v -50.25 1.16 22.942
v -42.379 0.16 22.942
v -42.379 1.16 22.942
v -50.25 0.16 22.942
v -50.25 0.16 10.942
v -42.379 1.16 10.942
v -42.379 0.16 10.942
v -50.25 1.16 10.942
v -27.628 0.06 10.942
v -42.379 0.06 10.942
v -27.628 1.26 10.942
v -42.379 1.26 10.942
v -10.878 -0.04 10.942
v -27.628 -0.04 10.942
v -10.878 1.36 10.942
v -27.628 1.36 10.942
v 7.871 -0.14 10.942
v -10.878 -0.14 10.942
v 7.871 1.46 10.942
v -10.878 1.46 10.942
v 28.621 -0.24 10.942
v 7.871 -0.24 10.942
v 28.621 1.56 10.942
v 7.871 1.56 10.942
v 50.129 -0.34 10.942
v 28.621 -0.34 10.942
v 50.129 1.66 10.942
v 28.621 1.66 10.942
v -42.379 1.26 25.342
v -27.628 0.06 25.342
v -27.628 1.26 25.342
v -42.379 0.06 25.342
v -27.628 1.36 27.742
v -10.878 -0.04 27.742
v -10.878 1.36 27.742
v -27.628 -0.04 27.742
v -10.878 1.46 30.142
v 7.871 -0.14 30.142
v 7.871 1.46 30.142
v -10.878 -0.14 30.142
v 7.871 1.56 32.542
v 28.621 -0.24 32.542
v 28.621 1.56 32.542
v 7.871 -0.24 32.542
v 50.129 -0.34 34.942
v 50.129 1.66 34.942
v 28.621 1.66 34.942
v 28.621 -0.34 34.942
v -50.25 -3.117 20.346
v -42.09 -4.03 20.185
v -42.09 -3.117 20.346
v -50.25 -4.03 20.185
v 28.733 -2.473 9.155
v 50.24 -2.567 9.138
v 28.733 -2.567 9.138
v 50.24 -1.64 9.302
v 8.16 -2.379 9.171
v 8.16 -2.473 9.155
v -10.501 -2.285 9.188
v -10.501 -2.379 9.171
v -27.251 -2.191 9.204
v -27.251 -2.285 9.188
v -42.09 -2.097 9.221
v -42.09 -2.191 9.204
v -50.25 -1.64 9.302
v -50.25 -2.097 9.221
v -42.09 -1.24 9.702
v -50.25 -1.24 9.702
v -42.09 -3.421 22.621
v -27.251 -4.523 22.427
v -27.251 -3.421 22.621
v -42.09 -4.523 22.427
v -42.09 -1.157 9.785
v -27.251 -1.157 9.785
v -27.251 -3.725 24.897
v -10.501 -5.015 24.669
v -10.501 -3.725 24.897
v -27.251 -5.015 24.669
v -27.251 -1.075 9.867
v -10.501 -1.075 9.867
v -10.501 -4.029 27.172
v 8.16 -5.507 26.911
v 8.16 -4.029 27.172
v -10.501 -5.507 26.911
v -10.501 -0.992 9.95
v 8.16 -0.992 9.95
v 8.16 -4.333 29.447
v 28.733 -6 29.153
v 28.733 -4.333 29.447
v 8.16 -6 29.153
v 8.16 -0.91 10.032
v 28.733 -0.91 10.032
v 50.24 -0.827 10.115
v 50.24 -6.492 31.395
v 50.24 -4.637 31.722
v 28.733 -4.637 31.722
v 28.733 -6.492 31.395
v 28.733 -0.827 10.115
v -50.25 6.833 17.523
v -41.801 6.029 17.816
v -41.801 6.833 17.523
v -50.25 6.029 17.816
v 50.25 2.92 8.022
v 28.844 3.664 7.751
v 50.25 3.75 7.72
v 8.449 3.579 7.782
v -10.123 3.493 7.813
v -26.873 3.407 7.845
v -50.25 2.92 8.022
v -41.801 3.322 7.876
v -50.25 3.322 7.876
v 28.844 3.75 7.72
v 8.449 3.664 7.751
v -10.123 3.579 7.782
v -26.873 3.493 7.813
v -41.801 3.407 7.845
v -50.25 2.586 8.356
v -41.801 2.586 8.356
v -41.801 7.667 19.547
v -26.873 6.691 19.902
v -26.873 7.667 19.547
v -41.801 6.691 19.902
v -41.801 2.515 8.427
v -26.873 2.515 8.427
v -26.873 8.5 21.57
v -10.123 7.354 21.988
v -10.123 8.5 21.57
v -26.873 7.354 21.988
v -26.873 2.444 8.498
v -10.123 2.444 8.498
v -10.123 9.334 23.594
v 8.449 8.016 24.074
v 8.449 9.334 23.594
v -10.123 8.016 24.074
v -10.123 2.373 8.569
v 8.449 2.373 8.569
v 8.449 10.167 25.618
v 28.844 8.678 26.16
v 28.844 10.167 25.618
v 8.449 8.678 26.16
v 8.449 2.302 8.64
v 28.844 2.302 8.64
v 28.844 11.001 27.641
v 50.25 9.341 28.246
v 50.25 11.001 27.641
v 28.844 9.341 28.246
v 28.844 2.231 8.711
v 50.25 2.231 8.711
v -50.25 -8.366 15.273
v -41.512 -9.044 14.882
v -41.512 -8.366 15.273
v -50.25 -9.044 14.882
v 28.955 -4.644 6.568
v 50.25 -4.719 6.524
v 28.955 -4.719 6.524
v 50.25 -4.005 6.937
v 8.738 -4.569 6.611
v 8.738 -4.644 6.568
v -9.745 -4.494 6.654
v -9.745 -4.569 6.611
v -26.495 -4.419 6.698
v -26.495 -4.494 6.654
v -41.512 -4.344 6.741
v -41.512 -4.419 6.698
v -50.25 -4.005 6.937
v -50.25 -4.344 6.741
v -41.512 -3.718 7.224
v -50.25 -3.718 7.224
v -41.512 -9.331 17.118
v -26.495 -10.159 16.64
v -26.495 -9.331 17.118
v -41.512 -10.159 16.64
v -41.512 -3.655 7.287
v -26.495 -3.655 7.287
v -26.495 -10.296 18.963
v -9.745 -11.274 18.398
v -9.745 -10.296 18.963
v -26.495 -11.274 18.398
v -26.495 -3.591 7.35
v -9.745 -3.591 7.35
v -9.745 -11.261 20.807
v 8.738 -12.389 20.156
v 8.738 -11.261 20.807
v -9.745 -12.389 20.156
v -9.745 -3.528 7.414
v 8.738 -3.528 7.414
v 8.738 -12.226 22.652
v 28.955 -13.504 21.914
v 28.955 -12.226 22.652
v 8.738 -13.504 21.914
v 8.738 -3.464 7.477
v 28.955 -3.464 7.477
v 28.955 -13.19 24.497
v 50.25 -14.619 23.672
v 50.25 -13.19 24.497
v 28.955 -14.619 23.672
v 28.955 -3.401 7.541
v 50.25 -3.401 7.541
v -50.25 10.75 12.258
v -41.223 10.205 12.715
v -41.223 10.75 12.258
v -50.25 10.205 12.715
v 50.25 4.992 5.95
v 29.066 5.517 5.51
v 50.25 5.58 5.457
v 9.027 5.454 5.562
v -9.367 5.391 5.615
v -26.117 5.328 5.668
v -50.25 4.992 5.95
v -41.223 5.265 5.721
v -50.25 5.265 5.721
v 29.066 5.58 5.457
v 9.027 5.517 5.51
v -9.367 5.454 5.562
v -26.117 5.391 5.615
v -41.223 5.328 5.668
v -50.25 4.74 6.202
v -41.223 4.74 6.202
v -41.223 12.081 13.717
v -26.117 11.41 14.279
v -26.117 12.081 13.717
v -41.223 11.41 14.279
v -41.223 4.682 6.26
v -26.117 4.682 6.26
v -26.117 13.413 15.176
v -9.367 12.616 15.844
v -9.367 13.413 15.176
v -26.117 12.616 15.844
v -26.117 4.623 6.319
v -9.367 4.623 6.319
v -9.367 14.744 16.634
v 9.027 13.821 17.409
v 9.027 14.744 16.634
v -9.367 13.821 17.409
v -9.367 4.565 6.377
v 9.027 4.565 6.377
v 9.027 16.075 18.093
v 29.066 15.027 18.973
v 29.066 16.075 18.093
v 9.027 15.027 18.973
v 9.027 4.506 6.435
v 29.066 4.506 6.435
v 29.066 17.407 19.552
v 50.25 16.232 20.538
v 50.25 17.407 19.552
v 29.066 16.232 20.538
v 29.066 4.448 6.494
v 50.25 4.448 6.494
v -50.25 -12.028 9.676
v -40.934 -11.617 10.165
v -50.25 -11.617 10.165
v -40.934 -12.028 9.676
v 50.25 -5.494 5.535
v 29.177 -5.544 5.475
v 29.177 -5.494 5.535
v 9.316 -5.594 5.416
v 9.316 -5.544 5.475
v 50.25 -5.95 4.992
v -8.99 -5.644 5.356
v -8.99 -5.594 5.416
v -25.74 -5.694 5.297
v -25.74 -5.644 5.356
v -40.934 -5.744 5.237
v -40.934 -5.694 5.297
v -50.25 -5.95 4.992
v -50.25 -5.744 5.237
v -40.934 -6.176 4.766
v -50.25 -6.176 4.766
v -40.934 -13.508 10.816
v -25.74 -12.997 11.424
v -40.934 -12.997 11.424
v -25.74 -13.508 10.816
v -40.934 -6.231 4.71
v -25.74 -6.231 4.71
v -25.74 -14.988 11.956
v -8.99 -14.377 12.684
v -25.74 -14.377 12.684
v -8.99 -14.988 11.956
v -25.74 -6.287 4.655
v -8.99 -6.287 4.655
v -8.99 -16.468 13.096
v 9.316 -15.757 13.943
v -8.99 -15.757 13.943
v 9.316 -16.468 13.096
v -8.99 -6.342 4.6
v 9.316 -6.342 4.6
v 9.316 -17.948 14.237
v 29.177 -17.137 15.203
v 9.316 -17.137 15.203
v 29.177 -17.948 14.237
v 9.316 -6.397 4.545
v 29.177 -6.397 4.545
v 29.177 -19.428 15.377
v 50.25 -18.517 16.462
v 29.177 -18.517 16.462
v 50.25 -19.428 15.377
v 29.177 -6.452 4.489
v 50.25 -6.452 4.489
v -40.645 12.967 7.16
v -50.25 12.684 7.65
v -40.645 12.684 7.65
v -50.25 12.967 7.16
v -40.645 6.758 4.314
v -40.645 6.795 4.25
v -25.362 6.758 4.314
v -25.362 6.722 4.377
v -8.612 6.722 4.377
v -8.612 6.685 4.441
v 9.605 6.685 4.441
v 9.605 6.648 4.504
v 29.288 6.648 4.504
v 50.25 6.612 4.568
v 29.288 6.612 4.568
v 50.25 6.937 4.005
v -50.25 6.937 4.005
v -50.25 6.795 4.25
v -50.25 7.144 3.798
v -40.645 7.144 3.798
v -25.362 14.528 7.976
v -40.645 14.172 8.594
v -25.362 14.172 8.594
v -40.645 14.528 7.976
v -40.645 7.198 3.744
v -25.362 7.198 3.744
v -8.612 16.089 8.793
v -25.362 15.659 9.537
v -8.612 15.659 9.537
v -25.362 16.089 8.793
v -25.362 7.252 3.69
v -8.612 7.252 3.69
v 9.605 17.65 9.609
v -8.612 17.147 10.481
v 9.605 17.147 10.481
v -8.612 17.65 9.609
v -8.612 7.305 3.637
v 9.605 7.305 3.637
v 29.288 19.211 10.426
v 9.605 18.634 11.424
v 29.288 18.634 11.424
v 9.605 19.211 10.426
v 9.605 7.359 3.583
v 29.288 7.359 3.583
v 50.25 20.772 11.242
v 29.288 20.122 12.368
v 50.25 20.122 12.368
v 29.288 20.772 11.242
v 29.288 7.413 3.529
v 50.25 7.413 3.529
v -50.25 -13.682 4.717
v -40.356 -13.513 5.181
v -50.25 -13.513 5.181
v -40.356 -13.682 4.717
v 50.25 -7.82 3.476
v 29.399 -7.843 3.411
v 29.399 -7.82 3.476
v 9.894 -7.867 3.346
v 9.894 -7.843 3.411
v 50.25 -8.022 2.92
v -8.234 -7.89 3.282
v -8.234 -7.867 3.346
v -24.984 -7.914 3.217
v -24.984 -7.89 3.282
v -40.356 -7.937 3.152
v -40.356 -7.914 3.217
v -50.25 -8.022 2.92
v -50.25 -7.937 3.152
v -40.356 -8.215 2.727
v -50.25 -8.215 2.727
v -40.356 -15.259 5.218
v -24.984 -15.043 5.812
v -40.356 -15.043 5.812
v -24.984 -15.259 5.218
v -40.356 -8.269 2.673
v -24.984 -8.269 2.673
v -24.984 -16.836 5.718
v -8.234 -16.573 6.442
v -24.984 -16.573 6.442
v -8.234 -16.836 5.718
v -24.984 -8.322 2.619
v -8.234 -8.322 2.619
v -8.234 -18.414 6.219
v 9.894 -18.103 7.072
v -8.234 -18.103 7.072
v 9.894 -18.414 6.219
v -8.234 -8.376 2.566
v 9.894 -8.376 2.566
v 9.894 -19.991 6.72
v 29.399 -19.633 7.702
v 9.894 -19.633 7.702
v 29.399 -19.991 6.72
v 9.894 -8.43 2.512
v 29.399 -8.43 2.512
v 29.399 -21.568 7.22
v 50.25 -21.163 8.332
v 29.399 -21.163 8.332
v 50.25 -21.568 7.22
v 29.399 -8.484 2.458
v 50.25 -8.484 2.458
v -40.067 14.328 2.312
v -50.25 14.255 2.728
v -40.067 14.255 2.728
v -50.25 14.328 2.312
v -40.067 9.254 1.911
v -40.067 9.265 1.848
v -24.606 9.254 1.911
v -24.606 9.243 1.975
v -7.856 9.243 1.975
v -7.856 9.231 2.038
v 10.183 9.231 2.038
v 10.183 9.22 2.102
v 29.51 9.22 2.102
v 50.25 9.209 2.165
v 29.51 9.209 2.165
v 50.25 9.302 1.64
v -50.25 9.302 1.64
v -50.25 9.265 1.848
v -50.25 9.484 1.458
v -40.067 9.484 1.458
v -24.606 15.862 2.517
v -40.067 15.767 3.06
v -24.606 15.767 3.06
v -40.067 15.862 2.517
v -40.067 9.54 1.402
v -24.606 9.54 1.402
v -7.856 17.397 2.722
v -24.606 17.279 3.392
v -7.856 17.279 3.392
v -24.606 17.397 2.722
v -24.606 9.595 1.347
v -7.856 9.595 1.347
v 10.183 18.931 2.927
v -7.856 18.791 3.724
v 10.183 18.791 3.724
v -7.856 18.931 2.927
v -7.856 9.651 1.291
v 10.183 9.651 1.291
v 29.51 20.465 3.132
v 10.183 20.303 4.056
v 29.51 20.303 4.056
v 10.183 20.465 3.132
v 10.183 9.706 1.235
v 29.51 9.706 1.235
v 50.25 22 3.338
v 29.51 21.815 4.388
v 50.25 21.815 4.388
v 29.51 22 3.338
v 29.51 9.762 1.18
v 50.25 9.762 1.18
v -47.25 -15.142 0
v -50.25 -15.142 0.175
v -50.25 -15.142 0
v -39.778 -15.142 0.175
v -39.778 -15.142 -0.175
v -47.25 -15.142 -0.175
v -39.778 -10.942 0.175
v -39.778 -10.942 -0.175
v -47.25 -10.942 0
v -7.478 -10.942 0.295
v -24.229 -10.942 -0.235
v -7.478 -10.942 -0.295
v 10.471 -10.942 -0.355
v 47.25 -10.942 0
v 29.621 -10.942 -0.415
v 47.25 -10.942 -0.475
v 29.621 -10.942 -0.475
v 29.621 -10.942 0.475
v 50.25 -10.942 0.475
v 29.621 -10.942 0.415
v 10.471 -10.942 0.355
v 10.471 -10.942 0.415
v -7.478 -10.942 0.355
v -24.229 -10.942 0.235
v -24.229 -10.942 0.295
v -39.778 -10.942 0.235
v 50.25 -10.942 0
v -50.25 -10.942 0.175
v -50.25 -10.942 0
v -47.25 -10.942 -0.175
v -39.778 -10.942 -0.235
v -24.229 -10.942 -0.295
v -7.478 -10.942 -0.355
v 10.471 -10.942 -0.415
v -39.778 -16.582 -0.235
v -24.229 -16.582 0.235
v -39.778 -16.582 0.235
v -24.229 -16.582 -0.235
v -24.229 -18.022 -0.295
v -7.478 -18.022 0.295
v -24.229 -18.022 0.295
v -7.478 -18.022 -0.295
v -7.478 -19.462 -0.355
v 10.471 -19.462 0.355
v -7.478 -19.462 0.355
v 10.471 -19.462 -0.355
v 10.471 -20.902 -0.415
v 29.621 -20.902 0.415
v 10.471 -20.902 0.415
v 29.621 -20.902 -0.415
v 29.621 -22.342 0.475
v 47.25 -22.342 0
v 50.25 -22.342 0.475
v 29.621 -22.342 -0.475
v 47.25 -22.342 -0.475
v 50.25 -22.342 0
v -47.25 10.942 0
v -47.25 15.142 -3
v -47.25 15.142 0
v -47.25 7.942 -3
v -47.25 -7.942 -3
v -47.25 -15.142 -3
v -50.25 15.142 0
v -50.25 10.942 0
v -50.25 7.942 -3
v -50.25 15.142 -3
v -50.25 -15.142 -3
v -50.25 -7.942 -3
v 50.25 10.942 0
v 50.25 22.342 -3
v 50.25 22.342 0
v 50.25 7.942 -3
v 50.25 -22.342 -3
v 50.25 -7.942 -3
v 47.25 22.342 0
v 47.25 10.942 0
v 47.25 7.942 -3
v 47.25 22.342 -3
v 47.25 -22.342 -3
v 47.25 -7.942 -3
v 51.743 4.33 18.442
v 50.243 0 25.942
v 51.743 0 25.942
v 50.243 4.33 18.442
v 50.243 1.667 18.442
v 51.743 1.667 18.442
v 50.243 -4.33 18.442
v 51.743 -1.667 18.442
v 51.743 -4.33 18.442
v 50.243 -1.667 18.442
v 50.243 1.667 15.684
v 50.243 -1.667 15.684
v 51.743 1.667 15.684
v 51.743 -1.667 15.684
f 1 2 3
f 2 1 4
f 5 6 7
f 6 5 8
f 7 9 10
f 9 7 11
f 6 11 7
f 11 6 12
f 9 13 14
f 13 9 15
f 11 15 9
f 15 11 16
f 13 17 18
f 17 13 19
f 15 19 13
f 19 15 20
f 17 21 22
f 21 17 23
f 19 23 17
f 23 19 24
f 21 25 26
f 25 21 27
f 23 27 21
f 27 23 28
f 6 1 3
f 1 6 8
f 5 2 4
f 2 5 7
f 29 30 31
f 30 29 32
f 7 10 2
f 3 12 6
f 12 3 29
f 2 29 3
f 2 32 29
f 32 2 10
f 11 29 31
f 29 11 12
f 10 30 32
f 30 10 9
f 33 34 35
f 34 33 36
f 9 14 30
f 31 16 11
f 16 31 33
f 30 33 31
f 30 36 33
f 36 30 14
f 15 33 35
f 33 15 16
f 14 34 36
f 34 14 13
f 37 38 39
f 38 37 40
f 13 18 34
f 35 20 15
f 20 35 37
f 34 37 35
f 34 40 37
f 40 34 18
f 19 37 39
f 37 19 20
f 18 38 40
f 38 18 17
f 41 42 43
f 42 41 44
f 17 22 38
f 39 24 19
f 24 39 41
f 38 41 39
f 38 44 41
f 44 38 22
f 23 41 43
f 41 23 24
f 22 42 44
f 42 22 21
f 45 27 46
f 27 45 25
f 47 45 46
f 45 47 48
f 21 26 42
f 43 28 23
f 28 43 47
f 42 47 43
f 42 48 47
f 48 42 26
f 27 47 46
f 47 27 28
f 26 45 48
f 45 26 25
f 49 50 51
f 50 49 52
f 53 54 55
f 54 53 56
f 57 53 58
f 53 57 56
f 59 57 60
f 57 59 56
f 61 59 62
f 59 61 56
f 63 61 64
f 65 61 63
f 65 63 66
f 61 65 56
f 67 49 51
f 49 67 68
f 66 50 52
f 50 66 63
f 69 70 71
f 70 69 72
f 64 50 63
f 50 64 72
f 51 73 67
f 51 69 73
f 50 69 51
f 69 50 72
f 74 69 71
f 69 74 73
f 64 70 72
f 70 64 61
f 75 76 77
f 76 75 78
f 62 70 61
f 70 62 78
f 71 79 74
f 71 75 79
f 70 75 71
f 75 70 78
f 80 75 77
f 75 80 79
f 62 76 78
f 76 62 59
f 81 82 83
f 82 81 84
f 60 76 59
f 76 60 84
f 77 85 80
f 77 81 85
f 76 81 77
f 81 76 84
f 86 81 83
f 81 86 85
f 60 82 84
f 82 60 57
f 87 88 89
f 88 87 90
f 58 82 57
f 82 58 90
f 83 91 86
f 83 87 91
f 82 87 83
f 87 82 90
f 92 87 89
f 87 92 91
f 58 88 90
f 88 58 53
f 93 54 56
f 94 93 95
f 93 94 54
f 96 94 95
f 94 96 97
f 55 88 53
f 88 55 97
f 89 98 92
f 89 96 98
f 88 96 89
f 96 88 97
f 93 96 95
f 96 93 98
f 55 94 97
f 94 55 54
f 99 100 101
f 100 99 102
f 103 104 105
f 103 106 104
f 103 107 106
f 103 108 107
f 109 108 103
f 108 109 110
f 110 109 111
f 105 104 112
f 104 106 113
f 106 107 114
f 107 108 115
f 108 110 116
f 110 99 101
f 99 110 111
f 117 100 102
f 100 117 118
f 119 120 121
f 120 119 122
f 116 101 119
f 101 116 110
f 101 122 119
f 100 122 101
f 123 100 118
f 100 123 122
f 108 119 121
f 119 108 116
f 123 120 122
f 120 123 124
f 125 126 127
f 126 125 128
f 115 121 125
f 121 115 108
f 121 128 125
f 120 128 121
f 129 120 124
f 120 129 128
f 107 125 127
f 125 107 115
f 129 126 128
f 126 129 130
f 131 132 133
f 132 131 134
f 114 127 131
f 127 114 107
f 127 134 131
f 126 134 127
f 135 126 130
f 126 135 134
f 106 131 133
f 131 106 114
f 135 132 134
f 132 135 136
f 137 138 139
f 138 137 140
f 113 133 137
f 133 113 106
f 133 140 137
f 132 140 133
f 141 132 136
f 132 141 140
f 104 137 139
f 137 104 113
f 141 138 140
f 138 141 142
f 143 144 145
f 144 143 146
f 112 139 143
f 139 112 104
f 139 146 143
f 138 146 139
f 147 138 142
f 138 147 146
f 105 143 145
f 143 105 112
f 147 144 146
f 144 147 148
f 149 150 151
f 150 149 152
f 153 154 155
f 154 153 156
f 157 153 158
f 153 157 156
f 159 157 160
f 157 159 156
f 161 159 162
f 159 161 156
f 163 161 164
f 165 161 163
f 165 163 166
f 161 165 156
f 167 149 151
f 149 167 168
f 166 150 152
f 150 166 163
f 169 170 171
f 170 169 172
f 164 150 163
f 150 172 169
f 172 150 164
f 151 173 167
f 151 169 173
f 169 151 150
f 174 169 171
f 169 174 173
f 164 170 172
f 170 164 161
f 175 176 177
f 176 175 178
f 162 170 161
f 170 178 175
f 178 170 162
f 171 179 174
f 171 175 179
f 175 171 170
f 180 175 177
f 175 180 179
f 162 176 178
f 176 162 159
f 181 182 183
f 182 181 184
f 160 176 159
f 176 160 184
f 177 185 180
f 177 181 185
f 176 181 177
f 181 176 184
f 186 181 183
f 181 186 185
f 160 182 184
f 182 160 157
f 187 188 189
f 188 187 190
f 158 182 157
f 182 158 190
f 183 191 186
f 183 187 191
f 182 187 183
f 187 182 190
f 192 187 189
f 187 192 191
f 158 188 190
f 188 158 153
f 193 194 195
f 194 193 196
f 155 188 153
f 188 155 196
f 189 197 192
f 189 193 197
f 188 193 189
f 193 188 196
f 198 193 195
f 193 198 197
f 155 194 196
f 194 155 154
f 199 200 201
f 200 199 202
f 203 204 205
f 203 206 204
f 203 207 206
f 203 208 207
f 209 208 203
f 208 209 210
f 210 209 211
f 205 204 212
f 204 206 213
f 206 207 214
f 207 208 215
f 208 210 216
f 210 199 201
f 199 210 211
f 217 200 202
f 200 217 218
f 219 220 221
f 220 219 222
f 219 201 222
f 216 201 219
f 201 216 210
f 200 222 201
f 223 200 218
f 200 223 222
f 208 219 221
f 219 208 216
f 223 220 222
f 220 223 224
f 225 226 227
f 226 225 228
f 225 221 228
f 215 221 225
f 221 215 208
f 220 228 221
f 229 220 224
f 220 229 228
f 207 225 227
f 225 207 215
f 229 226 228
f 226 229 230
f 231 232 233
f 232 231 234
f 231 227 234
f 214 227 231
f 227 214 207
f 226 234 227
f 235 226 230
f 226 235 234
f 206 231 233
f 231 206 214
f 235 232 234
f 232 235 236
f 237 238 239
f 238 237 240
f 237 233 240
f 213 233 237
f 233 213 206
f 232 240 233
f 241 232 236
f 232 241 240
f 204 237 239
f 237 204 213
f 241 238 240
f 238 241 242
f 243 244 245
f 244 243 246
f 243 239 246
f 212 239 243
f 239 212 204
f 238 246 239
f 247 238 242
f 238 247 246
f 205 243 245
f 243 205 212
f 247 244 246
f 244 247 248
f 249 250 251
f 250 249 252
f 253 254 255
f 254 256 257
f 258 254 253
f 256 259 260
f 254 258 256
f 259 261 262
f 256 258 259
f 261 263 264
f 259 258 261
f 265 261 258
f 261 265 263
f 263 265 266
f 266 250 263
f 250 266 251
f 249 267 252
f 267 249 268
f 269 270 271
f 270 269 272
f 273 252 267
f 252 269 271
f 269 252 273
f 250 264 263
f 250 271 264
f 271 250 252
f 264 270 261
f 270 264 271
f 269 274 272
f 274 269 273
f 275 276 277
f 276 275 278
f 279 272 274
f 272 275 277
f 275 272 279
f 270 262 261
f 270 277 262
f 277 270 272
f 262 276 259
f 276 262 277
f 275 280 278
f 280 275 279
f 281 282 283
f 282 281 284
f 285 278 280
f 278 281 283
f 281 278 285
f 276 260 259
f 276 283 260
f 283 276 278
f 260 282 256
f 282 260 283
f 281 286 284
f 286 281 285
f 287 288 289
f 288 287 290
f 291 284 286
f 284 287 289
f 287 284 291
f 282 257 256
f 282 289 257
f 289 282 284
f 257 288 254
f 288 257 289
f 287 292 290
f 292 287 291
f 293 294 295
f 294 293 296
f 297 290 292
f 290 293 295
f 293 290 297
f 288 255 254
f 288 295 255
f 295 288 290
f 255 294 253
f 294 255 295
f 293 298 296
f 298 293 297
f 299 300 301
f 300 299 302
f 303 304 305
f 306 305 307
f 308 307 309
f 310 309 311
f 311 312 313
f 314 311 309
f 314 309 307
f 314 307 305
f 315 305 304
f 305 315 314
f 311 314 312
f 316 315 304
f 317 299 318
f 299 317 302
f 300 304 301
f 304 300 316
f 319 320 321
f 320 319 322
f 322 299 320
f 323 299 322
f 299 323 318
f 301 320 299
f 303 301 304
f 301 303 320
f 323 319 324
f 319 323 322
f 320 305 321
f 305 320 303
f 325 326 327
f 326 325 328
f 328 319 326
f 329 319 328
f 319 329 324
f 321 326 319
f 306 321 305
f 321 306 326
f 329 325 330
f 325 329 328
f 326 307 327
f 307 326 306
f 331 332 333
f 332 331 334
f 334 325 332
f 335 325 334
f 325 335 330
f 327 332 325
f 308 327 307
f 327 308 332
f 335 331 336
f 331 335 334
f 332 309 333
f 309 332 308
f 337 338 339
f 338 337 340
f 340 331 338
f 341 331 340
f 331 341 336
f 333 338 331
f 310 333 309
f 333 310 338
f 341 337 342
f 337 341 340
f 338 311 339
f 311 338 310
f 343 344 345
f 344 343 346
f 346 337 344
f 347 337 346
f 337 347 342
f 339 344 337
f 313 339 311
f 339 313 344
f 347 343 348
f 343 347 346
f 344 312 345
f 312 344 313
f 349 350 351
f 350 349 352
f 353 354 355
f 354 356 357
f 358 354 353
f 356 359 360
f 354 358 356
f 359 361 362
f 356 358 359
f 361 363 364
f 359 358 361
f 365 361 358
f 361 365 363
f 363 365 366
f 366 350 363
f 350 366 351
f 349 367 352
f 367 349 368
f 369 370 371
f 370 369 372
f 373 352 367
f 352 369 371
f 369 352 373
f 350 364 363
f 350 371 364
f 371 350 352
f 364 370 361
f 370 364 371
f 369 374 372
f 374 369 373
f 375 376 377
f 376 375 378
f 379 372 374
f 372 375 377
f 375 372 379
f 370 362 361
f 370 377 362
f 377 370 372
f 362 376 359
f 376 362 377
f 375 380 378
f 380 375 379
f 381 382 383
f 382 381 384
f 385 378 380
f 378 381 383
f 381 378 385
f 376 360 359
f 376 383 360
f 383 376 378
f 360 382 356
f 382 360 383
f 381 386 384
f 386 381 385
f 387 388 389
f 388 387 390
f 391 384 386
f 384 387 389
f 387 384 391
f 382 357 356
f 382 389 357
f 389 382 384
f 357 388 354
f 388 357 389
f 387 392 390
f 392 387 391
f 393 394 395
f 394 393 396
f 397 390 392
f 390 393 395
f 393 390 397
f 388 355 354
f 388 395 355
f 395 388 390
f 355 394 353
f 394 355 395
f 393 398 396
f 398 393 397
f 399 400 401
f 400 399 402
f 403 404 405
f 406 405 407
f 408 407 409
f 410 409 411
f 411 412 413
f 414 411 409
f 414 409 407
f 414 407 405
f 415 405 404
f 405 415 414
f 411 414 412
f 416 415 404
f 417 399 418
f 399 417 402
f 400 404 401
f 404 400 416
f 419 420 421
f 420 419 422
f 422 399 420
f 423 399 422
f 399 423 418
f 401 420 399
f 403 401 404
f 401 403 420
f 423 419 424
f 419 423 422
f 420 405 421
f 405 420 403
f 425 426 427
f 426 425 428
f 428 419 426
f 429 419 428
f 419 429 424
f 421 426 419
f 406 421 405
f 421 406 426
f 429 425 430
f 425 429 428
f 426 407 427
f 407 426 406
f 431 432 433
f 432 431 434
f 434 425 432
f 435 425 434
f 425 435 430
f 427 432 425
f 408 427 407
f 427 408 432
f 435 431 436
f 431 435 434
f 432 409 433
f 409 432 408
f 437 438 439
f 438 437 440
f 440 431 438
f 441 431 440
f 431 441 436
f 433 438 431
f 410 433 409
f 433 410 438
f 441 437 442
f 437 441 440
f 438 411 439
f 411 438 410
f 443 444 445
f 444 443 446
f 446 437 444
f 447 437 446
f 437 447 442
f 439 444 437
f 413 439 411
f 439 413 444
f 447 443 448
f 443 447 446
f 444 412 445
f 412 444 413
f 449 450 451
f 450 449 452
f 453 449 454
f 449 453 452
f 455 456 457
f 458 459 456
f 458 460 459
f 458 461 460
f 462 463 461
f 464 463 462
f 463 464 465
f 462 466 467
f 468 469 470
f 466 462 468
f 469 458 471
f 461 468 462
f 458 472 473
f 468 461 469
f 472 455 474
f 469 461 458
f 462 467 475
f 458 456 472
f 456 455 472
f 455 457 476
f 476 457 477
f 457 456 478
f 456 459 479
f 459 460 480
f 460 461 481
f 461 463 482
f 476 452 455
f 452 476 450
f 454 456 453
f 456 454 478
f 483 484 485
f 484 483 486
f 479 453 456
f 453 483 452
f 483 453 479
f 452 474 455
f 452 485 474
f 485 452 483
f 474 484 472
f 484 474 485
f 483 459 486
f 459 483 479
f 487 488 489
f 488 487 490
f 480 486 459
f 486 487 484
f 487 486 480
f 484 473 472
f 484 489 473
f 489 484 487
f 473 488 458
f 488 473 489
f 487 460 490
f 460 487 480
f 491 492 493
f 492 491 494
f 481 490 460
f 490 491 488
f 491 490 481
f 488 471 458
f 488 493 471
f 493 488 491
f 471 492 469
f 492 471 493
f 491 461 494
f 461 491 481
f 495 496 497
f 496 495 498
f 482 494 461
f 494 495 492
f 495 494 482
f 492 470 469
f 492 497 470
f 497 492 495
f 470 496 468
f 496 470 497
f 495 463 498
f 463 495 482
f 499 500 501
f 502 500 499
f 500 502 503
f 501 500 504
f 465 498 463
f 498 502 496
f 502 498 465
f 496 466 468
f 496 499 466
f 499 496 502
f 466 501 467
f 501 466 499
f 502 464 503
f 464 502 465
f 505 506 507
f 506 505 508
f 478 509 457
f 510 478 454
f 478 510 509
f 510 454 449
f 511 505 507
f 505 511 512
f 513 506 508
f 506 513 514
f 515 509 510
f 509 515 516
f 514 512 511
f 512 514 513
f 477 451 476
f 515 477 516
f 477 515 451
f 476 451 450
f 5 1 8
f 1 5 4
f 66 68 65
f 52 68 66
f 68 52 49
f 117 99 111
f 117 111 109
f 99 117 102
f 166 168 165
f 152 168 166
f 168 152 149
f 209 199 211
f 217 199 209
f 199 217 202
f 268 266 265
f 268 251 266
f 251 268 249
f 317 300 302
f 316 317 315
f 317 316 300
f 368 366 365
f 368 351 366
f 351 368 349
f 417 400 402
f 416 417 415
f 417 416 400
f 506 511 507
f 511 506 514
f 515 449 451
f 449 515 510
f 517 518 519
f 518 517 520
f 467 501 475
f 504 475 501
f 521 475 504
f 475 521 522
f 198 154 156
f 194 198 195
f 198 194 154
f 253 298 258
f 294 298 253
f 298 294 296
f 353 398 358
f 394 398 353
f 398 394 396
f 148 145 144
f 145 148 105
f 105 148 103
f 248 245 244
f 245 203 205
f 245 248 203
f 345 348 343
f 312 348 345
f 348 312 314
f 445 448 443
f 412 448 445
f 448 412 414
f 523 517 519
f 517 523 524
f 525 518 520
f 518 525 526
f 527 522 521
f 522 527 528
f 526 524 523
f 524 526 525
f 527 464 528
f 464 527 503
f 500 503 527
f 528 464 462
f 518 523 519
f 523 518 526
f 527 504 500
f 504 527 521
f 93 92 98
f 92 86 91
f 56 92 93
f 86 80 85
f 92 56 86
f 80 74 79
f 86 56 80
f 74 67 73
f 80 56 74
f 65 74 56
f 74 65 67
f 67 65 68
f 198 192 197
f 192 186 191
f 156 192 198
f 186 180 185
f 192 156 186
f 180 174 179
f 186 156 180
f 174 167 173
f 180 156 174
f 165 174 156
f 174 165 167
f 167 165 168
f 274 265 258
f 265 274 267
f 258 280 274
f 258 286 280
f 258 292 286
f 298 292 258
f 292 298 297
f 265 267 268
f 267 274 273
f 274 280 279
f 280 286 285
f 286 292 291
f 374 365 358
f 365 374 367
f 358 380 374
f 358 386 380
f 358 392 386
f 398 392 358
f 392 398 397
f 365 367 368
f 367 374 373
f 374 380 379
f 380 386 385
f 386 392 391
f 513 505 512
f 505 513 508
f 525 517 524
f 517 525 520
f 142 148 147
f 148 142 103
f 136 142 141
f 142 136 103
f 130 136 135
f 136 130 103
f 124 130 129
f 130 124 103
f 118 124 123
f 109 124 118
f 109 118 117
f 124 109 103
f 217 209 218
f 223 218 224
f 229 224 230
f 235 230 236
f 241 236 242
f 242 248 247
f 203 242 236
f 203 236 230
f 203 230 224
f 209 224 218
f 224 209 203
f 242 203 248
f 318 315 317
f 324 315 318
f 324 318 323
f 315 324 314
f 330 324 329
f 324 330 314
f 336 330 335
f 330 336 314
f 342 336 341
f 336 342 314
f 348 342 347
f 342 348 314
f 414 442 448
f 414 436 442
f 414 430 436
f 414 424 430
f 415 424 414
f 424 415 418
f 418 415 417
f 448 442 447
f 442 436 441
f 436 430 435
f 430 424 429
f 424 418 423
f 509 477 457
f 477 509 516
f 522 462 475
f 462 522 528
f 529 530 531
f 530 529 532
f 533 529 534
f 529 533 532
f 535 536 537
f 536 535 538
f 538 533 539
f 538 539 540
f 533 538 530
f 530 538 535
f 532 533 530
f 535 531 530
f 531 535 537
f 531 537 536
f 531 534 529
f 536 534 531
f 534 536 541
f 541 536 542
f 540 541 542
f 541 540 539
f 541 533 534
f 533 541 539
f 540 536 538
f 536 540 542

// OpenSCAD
// file: ../include/vector_math.scad
// vector_math.scad - a scad file containing resource functions for working with vectors.
// Ben Weiss, University of Washington 2016


// returns a list of zeros of a specified length
function zeros(size) = size > 0 ? [ for (i = [0:size-1]) 0 ] : [];
function ones(size) = size > 0 ? [ for (i = [0:size-1]) 1 ] : [];

// flattens a list
// output : list with the outer level nesting removed
function flatten(l) = [ for (a = l) for (b = a) b ] ;

// interleaves two vectors and returns the result. The vectors must be the same length.
function interleave(first, second) = flatten([ for (i = [0 : 1 : len(first) - 1]) [first[i], second[i]] ]);

// returns the map [a[b[0]], a[b[1]], ..., a[b[n]]]
function veclookup(a, b) = [ for (i = [0 : 1 : len(b) - 1]) a[b[i]] ];

// generate a list of ordinal numbers (0, 1, 2...), as you would normally get using
// [start:step:end].
function series(start, step, end) = [ for (i = [start : step : end]) i ];
	
// Reverses the order in a list
function reverse(list) = [ for (i = [0:len(list)-1]) list[len(list) - 1 - i] ];

// recursion - find the sum of the values in a vector (array)
// from the start (or s'th element) to the i'th element - remember elements are zero based

function sumv(v,i,s=0) = (i==s ? v[i] : v[i] + sumv(v,i-1,s));
function sum(v) = sumv(v, len(v) - 1);
function sucsum(v) = [ for (i = [0 : len(v) - 1]) sumv(v, i)];

// Similar to the above, but recursively combines all elements into a single string, without commas.
function strconcatv(v, i, s=0) = (i==s ? str(v[i]) : str(str(v[i]), strconcatv(v,i-1,s)));
function strconcat(v) = strconcatv(v, len(v) - 1);
	
// Take the first or last few elements of a vector. Use negative n to read from the end.
function take(vec, n=1) = [ for (i = [0 : abs(n)-1]) n < 0 ? vec[len(vec) - i - 1] : vec[i] ];
	
// Pick a single element out of a list. This is like [k], except [-k] counts from the end. FUTURE: Support splicing by specifying k as a list.
function elem(vec, k) = k >= 0 ? vec[k] : vec[len(vec) + k];
// file: ../include/barcode.scad
// Barcode generator test
// This script generates an interleaved 2of5 barcode for marking parts
// Source data: https://en.wikipedia.org/wiki/Interleaved_2_of_5
//
// NOTE: functions barcode() and barcode_block() only work
// for codes up to about 15 digits before we reach double precision
// roundoff. For longer codes, use barcode_long() and specify the
// digits as an array.

use <vector_math.scad>;

testing = false;
if(testing)
{
	input = 1;


	translate([5, 10, 0])
	color([0.1, 0.1, 0.1])
	echo(barcode_length=barcode_length(4, 0.5));
	barcode(input, min_digits=4, line_width=0.5,center=true);
}

// barcode() works for codes up to 15 digits long. After that, my ability to discern
// digits is constrained by floating point arithematic. To get more digits, use 
// barcode_long and pass it an array of digits.
//
// Parameters:
//   code: number to encode into the barcode
//   min_digits: minimum number of digits (so code=1, min_digits=4 encodes "0004")
//   invert: make the geometry the spaces instead of the bars. This is sometimes useful
//      for example when doing a difference().
//   line_width=1: width of a thin line or gap in model units
//   bar_heigth=10: height of the barcode bars in model units
//   bar_depth=1: depth of the barcode object (thickness into the page)
//   thick_thin_ratio=2.5: ratio of the thick line to thin line thickness. Should be 2.2-3.0
//   center=false: draw the object at the origin centered (similar to cube()).
module barcode(code, min_digits=0, invert=false, line_width=1, bar_height=10, bar_depth = 1, thick_thin_ratio=2.5, center=false)
{
	raw = get_digits(code);
	input = concat(zeros(min_digits - len(raw)), raw);
	barcode_long(input, min_digits, invert, line_width, bar_height, bar_depth, thick_thin_ratio, center);
}
module barcode_long(input_digits, min_digits=0, invert=false, line_width=1, bar_height=10, bar_depth = 1, thick_thin_ratio=2.5, center=false)
{
	

	bar_widths = [line_width, line_width * thick_thin_ratio];		// widths of the bars.
	start_code = [0, 0, 0, 0];
	end_code = [1, 0, 0];
	digit_codes = [[0,0,1,1,0],
						[1,0,0,0,1],
						[0,1,0,0,1],
						[1,1,0,0,0],
						[0,0,1,0,1],
						[1,0,1,0,0],
						[0,1,1,0,0],
						[0,0,0,1,1],
						[1,0,0,1,0],
						[0,1,0,1,0]];
	// We can only encode an even number of digits
	digits = len(input_digits) % 2 == 0 ? input_digits : concat(0, input_digits);
	if(testing) echo(digits=digits);
	
	// do the interleaving so we have a single vector of widths for each step
	widths = veclookup(bar_widths, concat(start_code,
									flatten([ for (i = [0 : 2 : len(digits) - 1]) 
												interleave(digit_codes[digits[i]], digit_codes[digits[i+1]]) ]),
									end_code));
	centers = sucsum(concat(0,widths)) + widths * 0.5;
	if(testing) echo(widths=widths);
	if(testing) echo(centers=centers);

	// Now we just have to generate the solids
	translate(center ? [-barcode_length(len(digits), line_width, thick_thin_ratio) * 0.5, -bar_height * 0.5, -bar_depth * 0.5] : [0, 0, 0])
	for(i = [(invert ? 1 : 0):2:(len(widths) - 1)])
	{
		translate([centers[i], bar_height * 0.5, bar_depth * 0.5])
		cube(size=[widths[i], bar_height, bar_depth], center=true);
	}
}

// Creates a negative barcode in a block (convenience function)
module barcode_block(code, min_digits=0, invert=false, line_width=1, bar_height=10, bar_depth = 1, thick_thin_ratio=2.5, center=false, x_margin=8, y_margin=4)
{
	translate(center ? [0, 0, 0] : [0.5 * barcode_length(num_digits(code)) + x_margin, 0.5 * bar_height + y_margin, bar_depth * 0.5])
	difference()
	{
		cube(size=[barcode_length(max(min_digits, num_digits(code)), line_width) + x_margin * 2, bar_height + y_margin * 2, bar_depth],center=true);
		barcode(code, min_digits, invert, line_width, bar_height, bar_depth * 1.01, thick_thin_ratio, center=true);
	}
}

// Utility function: returns the width of the barcode, given the number of digits
function barcode_length(num_digits, line_width=1, thick_thin_ratio=2.5) = (4 + (2 + thick_thin_ratio) + (thick_thin_ratio * 2 + 3) * ceil(num_digits/2)*2) * line_width;

// returns the successive digits in a number.
function num_digits(num) = num == 0 ? 1 : ceil(log(num + 0.001));
function get_digits(num) = [ for (i = [num_digits(num):-1:1]) floor((num % pow(10, i)) / pow(10, i-1)) ];
	
// main file
/********************************************
 * Angle Interpolation Test Model for Fins
 *
 * Ben Weiss, University of Washington 2016
 *
 * This model is used to determine the minimum
 * thickness required to obtain printable and
 * acceptable results for negative fin (slot)
 * features at various angles between horizontal
 * and vertical.
 *
 * This model is part of a collection of models
 * for determining angle interpolation information
 * for a printer. 
 *******************************************/

include <../include/features.scad>;

serialNo = 13;						// test number to encode in barcode

optionCount = 6;       // number of different thicknesses to produce
onlyHalf = true;
// That parameter will need to become hard-coded here pretty quick in order to match the front end

// Special variables set by front end.
layerHeight = 0.1;      // mm
nozzleDiameter = 0.1;   // mm


/*
<json>
	{
		"Imports": {

			"basic.yellow_final_NegFinThkV":"vSizeMean",
			"basic.yellow_error_NegFinThkV":"vSizeOffset",
			"basic.yellow_final_NegFinThkH":"hSizeMean",
			"basic.yellow_error_NegFinThkH":"hSizeOffset",

			"basic.yellow_final_NegFinThkV":"greenVSlotThk",
			"basic.yellow_final_NegFinThkH":"greenHSlotThk",
			"basic.yellow_final_PosFinThkH":"greenHFinThk",
			"basic.yellow_final_PosFinThkV":"greenVFinThk"
		}
	}
</json>
*/

// Results from the main eval model needed here, to be overridden by the GUI.
vSizeMean = 1.5;
vSizeOffset = 0.5;
hSizeMean = 0.65;
hSizeOffset = 0.3;

greenVFinThk = 0.125;
greenHFinThk = 0.125;
greenVSlotThk = vSizeMean;
greenHSlotThk = hSizeMean;





/*
This is an array variable declaration. It will be expanded into a set of variables
by the backend on load and re-condensed only for communicating with openscad.
The variables min[varBase], max[varBase], and skip[varBase] will be arrays.

Note that the angles reported are 90° from the angle variable when they are actually computed. the angle variable stores the angle away from vertical.
<json>
    {
        "Name": ["90° Vertical Slots", 
								 "80° Slots",
								 "70° Slots",
								 "60° Slots",
								 "50° Slots",
								 "40° Slots",
								 "30° Slots",
								 "20° Slots",
								 "10° Slots",
								 "0° Horizontal Slots"],
        "Desc": "Use the slider to indicate how many fins printed acceptably.",
        "LowKeyword": "Lost",
        "HighKeyword": "Printed",
        "varBase": "Thks",
        "minDefault": 0.075,
        "maxDefault": 0.175,
        "minDefaultND": "0.5 * nozzleDiameter",
        "maxDefaultND": "5 * nozzleDiameter",
        "cameraData": "9.57,-17.9,8.45,57.8,0,314.8,85",
        "sortOrder": 0,
				"instanceCount": 6
    }
</json>
*/

// Range of thicknesses. These arrays will be overridden by the front end.
angleCount = 10;
angles = [ for (i = [0:angleCount-1]) 
		90 * i / (angleCount - 1) * (onlyHalf ? 1 : 2) ];

minThks = fspread(count=angleCount, 
								low=vSizeMean - vSizeOffset,
								high=hSizeMean - hSizeOffset);
maxThks = fspread(count=angleCount, 
								low=vSizeMean + vSizeOffset,
								high=hSizeMean + hSizeOffset);
								
skipThks = ones(angleCount) * -1;



// Derived parameters for the object
maxThk = max(maxThks);
maxWidth = maxThk * finWidthThkRatio;
minThk = min(minThks);
minGap = max([greenVFinThk, greenHFinThk, greenVSlotThk, greenHSlotThk]);
meanThk = max([ for (i=[0:len(maxThks)-1]) (minThks[i] + maxThks[i]) * 0.5]);

coreDia = angleCount * (maxThk + minGap / 2) * 2.5 / pi * (onlyHalf ? 1 : 0.5);
coreLen = optionCount * meanThk * finWidthThkRatio + (optionCount + 1) * minGap;

symbolSize = maxThks[0] * finWidthThkRatio / 2;

fudge = minThk * 0.02;

// Render the geometry
color(normalColor)
difference()
{
	core();
	/*
	// Now subtract the individual slots
	for(i = [0:angleCount-1])
	{
		angle = angles[i];
		translate([0, i == 0 ? maxThks[0] * 0.33 : 0, 0])	// offset just the vertical fins so it fits better.
		rotate([i % 2 ? angle : -angle, 0, 0])
		translate([0, 0, fOffsetHeight(coreDia, angle)])
			fin_set(minThks[i], maxThks[i], skipThks[i], padLen=coreDia);
	}
	*/
}
// Draws the core of the object
module core()
{
	union()
	{
		difference()
		{
			union()
			{
				for(i = [0:angleCount-1])
				{
					angle = angles[i];
					translate([0, i == 0 ? maxThks[0] * 0.33 : 0, 0])	// offset just the vertical fins so it fits better.
					rotate([i % 2 ? angle : -angle, 0, 0])
					translate([0, 0, fOffsetHeight(coreDia, angle)])
						fin_set_long(minThks[i], maxThks[i], finLenThkRatio, finWidthThkRatio, coreLen, optionCount, force_width_x=maxThk * finWidthThkRatio + minGap + fudge);
				}
				// Add feet to the hull to make it flat on the bottom
				translate([-coreLen * 0.5 + minGap, 0, -minGap])
					cube(size=[minGap * 2, coreDia + 2 * minThks[len(maxThks)-1] * finLenThkRatio, 2 * minGap], center=true);
				translate([coreLen * 0.5 - minGap, 0, -minGap ])
					cube(size=[minGap * 2, coreDia + 2 * maxThks[len(maxThks)-1] * finLenThkRatio, 2 * minGap], center=true);
			}
			// core hollow
			rotate([45, 0, 0])
			cube(size=[coreLen * 2, coreDia * 0.7071, coreDia * 0.7071], center=true);
			
			// a wall at the small end to chop off unneeded extra geometry
			translate([-(coreLen + maxWidth) * 0.5, 0, 0])
			cube(size=[maxWidth, (maxWidth + coreDia) * 2, (maxWidth + coreDia) * 2], center=true);
			
			// a wall at the big end to chop off unneeded extra geometry
			translate([(coreLen + maxWidth) * 0.5, 0, 0])
			cube(size=[maxWidth, (maxWidth + coreDia) * 2, (maxWidth + coreDia) * 2], center=true);
		}
			
		// Add a marking to the big end in case it's hard to tell
		translate([(coreLen + minGap) * 0.5 - fudge, 0, (coreDia + maxWidth) * 0.5])
		{
			rotate([0, -90, 0])
				cylinder(h=minGap, d = symbolSize, center=true, $fn=3);
			// add the bottom of the arrow
			translate([0, 0, -symbolSize * 0.5 * 0.71828])
				cube(size=[minGap, symbolSize / 3, symbolSize / 3], center=true);
		}
	}
}


// A special function for determining how far out from the centerline to trave
// to intersect with the diamond-shaped core at a given angle.
// This is derived from a law of Sines argument from the geometry.
function fOffsetHeight(coreDia, angle) = coreDia * 1.4142 / 4 / sin(135 - angle);
